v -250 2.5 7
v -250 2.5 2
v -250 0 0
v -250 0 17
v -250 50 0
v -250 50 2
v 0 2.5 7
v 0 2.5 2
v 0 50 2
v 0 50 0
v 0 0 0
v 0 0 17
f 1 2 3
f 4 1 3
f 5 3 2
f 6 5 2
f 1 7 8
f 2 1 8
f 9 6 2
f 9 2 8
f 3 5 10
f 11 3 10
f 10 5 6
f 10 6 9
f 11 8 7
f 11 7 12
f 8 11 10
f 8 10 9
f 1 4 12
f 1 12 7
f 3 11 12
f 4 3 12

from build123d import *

# Parameters (mm, degrees)
ESQUISSE1_W        = 250
ESQUISSE1_H        = 50
BOSS_EXTRU_1_DEPTH = 2
BOSS_EXTRU_2_DEPTH = 250


with BuildPart() as part:
    # Esquisse1 → Boss.-Extru.1 (new body)
    with BuildSketch(Plane.XY):
        with Locations((-125, 25)):
            Rectangle(ESQUISSE1_W, ESQUISSE1_H)
    extrude(amount=BOSS_EXTRU_1_DEPTH)

    # Esquisse2 → Boss.-Extru.2 (add)
    with BuildSketch(Plane(origin=(0, 0, 0), x_dir=(0, 0, -1), z_dir=(1, 0, 0))):
        Polygon((-2, 0), (-17, 0), (-7, 2.5), (-2, 2.5), align=None)
    extrude(amount=-BOSS_EXTRU_2_DEPTH)


solid = part.part
